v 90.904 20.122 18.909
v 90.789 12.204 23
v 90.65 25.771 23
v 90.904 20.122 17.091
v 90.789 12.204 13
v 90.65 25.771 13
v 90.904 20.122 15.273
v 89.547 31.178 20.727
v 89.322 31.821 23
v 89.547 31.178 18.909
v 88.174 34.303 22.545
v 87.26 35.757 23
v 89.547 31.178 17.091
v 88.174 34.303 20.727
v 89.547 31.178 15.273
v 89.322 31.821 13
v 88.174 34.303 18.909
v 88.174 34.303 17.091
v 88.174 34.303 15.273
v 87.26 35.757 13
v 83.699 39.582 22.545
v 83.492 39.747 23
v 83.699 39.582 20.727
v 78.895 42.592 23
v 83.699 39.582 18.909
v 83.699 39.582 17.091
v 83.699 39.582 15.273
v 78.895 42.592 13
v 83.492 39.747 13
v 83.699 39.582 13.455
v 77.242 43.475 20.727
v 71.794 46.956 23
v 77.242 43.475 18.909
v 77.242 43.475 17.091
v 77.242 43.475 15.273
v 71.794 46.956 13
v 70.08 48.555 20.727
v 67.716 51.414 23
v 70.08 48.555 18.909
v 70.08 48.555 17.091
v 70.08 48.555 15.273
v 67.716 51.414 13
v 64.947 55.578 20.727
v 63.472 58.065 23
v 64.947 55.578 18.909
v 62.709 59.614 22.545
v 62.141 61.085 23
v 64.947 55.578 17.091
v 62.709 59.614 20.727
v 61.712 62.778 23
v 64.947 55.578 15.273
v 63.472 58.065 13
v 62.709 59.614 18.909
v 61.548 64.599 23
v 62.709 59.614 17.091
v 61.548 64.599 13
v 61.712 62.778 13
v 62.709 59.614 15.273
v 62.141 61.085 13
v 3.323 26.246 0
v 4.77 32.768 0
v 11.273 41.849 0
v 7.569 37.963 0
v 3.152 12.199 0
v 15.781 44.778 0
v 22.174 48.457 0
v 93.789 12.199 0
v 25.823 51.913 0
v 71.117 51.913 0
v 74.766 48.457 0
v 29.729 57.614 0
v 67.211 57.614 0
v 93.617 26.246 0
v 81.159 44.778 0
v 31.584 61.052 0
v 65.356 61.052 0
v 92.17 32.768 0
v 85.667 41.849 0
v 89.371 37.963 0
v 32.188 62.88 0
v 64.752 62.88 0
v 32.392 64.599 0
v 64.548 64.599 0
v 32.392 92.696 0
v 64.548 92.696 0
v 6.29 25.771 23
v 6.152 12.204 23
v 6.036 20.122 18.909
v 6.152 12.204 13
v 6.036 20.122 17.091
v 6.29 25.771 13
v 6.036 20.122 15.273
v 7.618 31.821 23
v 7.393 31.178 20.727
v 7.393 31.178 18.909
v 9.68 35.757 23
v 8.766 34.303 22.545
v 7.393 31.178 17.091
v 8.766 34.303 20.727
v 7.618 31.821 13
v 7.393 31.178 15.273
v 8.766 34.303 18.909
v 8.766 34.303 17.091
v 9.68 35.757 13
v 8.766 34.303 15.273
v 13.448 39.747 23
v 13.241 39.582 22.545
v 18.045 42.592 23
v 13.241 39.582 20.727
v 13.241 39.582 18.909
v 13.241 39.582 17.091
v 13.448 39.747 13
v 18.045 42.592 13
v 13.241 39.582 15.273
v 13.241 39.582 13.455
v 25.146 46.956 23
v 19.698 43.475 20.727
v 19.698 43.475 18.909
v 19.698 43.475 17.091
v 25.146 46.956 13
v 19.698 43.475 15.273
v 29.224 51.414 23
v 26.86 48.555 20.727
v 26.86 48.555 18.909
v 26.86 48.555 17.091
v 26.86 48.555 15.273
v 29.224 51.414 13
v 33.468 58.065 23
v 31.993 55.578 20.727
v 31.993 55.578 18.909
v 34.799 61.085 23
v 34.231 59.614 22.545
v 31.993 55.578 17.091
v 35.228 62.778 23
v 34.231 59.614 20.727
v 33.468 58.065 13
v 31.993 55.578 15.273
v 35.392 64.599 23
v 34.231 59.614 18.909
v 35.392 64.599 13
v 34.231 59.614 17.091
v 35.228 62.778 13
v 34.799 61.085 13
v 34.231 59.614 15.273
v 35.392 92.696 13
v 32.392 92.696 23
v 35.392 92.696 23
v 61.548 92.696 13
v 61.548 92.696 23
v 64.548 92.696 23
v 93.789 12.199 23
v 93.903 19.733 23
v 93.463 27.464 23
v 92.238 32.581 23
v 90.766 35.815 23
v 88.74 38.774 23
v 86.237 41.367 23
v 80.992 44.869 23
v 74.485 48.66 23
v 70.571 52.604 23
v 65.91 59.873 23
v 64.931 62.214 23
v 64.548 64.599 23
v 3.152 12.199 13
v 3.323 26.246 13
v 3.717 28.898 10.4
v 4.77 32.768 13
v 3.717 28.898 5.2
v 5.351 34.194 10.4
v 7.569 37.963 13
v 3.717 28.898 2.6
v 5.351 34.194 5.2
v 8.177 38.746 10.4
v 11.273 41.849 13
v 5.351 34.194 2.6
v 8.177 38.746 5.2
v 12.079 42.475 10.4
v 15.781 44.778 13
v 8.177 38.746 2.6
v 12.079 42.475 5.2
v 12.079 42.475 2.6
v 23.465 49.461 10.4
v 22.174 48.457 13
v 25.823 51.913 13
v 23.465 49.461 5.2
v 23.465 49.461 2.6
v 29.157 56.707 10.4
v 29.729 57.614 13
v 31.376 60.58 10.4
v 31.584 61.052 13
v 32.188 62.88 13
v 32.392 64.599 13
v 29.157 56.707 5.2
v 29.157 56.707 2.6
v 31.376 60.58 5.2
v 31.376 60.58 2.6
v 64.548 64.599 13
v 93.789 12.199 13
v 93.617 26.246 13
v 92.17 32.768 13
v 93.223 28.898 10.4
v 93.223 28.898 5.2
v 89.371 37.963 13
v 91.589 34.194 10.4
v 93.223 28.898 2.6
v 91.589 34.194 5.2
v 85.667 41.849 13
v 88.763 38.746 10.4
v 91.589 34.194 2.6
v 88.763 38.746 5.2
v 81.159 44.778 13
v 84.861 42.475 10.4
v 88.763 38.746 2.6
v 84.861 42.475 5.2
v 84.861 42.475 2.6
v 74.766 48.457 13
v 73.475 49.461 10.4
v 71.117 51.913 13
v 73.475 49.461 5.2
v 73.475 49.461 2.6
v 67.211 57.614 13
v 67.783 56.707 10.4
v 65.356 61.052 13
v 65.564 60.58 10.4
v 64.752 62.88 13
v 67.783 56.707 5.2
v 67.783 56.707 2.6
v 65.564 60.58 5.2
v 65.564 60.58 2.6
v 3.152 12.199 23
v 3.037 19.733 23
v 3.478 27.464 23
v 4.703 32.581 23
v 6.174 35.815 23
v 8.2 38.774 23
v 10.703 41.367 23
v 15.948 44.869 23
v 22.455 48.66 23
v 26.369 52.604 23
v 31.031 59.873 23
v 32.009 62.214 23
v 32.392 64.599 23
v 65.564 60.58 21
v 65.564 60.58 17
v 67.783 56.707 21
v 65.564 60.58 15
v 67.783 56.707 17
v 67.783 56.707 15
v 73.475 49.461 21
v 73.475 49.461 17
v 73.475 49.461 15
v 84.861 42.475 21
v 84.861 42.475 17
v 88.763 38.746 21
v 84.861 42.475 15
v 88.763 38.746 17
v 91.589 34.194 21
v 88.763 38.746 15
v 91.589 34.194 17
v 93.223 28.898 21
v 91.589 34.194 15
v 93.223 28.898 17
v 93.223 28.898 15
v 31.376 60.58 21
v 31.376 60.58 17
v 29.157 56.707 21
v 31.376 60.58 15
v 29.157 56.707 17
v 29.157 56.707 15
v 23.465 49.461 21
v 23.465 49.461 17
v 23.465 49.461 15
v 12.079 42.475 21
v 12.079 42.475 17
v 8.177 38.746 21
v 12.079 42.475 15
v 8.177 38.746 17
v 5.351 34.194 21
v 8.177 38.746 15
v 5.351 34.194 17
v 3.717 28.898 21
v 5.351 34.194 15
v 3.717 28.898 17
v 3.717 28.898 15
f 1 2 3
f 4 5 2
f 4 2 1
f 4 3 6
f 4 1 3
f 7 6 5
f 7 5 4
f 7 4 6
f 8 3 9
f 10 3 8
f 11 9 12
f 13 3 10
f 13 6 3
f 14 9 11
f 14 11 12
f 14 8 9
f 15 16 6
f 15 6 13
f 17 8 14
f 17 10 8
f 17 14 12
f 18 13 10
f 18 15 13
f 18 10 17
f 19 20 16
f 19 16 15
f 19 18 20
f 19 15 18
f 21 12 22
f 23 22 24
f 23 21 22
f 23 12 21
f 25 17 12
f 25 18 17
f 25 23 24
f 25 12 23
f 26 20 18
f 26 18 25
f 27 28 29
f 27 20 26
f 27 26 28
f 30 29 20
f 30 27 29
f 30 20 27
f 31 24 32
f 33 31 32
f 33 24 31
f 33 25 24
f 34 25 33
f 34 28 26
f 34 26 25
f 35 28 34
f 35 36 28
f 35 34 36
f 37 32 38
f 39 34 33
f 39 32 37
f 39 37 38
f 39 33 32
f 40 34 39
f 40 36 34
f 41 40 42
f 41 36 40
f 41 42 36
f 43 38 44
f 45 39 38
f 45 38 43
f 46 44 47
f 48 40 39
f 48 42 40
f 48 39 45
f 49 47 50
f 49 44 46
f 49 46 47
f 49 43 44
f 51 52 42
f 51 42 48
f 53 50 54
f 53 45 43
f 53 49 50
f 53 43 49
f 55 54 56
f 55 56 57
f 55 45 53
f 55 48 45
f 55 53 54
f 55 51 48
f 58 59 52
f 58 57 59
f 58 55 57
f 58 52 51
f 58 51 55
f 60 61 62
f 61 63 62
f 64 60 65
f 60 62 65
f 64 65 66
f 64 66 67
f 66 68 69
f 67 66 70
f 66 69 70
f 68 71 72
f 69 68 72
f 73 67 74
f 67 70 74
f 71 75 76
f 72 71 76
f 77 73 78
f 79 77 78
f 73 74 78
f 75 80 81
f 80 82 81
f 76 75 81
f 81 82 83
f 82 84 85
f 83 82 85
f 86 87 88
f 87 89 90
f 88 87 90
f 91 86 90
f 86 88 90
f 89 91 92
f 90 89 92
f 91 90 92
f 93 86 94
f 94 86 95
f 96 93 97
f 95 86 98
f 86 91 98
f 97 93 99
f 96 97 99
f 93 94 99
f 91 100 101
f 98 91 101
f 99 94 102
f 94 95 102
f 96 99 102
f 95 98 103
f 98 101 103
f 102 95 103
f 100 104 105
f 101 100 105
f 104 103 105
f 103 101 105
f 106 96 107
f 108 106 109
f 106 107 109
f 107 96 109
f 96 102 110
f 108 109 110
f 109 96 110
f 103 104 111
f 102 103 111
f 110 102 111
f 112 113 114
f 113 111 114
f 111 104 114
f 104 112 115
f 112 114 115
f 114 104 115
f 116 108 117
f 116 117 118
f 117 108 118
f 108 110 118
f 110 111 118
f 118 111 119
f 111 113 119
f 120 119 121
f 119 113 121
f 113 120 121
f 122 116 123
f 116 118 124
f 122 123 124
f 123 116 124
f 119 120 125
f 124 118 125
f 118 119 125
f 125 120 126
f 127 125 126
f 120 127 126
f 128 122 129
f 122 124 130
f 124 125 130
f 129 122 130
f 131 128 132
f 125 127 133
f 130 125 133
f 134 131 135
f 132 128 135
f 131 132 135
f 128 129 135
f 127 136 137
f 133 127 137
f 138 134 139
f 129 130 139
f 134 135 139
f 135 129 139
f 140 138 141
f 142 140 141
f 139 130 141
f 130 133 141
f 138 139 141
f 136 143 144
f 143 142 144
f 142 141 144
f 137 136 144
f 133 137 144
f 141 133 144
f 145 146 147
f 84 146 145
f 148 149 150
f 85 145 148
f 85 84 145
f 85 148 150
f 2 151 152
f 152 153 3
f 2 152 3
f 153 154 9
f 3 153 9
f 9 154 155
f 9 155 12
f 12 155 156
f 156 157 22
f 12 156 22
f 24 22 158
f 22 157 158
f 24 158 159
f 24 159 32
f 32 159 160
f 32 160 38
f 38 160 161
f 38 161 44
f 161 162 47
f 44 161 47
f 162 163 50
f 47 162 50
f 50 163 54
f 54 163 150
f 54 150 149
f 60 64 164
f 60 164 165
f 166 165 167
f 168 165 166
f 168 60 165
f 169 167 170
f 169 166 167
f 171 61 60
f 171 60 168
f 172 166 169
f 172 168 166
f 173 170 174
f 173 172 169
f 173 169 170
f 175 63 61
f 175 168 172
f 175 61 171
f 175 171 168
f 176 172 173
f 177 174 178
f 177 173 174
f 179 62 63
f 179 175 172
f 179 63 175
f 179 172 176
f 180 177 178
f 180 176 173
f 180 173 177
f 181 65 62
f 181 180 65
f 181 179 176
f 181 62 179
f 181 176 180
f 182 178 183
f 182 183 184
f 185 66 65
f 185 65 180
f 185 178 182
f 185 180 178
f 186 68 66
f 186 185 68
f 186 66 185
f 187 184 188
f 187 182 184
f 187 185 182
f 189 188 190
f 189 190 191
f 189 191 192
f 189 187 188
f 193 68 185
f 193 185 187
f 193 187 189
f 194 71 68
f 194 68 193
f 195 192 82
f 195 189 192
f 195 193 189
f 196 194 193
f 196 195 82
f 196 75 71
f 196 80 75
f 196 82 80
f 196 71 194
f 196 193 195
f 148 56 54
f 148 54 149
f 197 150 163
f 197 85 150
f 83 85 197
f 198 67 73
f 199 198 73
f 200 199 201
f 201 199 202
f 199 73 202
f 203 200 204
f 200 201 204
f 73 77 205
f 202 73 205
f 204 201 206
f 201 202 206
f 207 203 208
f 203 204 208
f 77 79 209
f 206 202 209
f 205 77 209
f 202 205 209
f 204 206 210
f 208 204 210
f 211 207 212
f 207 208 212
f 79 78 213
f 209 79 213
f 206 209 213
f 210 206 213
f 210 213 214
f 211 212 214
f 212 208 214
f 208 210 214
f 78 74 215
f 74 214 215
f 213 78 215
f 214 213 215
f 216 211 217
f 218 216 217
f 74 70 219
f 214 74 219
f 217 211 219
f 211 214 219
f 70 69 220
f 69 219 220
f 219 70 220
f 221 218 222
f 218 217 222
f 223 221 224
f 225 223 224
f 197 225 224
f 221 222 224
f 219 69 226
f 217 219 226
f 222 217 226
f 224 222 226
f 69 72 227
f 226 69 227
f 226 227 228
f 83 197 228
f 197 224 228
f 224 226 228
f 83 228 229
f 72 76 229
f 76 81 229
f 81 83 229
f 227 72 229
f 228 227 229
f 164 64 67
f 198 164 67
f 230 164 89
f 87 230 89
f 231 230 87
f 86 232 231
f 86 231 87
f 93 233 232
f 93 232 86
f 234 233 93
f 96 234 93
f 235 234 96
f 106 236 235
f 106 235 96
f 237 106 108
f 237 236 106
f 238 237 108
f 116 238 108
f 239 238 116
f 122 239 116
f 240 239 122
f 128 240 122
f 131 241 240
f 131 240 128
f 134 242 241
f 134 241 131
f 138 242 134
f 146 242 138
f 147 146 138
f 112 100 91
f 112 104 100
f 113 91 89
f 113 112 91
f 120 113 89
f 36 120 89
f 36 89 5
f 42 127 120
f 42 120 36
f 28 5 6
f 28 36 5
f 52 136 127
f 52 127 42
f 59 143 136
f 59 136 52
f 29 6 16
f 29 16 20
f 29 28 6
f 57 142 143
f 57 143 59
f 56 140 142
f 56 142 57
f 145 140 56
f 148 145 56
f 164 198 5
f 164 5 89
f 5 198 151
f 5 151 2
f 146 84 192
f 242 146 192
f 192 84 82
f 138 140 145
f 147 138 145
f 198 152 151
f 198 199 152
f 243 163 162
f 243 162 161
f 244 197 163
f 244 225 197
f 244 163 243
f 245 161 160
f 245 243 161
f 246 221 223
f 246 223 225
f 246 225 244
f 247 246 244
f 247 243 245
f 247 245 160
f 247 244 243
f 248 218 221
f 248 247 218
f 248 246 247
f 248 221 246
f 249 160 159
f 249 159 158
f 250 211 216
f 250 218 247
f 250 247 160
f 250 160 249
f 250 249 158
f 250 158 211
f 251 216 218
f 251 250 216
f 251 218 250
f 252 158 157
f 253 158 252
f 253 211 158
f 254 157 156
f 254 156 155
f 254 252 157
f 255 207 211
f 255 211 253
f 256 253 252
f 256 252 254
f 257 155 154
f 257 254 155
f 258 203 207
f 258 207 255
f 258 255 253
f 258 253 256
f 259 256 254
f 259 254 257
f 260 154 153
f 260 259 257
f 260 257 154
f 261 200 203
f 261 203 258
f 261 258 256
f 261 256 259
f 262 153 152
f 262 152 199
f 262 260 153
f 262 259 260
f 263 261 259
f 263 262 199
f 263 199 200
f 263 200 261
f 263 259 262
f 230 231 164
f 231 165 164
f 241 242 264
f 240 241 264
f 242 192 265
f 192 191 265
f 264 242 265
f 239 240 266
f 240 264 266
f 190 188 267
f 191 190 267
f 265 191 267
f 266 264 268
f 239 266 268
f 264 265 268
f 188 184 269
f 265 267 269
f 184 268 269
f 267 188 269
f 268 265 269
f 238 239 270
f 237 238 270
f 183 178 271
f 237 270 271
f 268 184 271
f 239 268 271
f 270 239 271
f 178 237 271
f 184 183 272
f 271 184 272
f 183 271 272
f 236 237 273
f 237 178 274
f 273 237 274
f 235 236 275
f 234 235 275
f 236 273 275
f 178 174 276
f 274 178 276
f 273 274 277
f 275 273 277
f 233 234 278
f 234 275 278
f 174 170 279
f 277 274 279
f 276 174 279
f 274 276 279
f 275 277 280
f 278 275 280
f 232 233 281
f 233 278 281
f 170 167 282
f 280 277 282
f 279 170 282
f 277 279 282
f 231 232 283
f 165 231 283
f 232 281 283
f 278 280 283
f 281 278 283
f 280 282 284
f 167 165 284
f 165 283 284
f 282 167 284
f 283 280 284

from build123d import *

# Parameters (mm, degrees)
ESTRUSIONE_ESTRUSIONE1_DEPTH = 13
ESTRUSIONE_SOTTILE5_DEPTH    = 10


# Read off the part's stored shape, not the designer's step: Estrusione-Sottile5
with BuildPart() as part:
    # Schizzo1 → Estrusione-Estrusione1 (new body)
    with BuildSketch(Plane.XY):
        with BuildLine():
            Line((32.3920487, 64.599216546), (32.3920487, 92.695802437))
            Line((32.3920487, 92.695802437), (48.470036729, 92.695802437))
            Line((48.470036729, 92.695802437), (48.470036729, 12.199228267))
            Line((48.470036729, 12.199228267), (3.151561413, 12.199228267))
            add(Edge.make_bspline(
                [(3.151561413, 12.199228267), (3.139611177, 19.224996267), (1.892686637, 31.387863298), (12.137321926, 43.966124148), (23.267751598, 47.670295467), (28.997328985, 56.366188951), (32.3920487, 61.880405589), (32.3920487, 64.599216546)],
                knots=[0, 0, 0, 0, 0.347386822, 0.514075999, 0.722780372, 0.866740614, 1, 1, 1, 1], degree=3))
        make_face()
    estrusione_estrusione1 = extrude(amount=ESTRUSIONE_ESTRUSIONE1_DEPTH)

    # Estrusione-Sottile5 outline → Estrusione-Sottile5 (add)
    with BuildSketch(Plane.XY.offset(13)):
        with BuildLine():
            Line((32.3920487, 92.695802437), (32.3920487, 64.599216546))
            add(Edge.make_bspline(
                [(32.3920487, 64.599216546), (32.3920487, 61.880405589), (28.997328985, 56.366188951), (23.267751598, 47.670295467), (12.137321926, 43.966124148), (1.892686637, 31.387863298), (3.139611177, 19.224996267), (3.151561413, 12.199228267)],
                knots=[0, 0, 0, 0, 0.133259386, 0.277219628, 0.485924001, 0.652613178, 1, 1, 1, 1], degree=3))
            Line((3.151561413, 12.199228267), (6.151557074, 12.204331005))
            add(Edge.make_bspline(
                [(6.151557074, 12.204331005), (6.149334866, 13.510808651), (6.119648943, 14.831885644), (6.06293225, 17.480029501), (6.03584378, 18.807019929), (6.037068448, 22.752005394), (6.151453161, 25.333469119), (6.757390346, 28.929919641), (7.030718923, 30.082494468), (7.57350109, 31.725152792), (7.776519692, 32.258469787), (8.231352372, 33.295835374), (8.485381605, 33.804131964), (9.889253187, 36.299307042), (11.433784909, 38.123415419), (13.69240187, 39.947060574), (14.157760625, 40.286091152), (15.150594798, 40.947311626), (15.673944983, 41.267323739), (17.308950011, 42.213099328), (18.485640453, 42.822946504), (20.909634026, 44.126845944), (22.157818902, 44.820909202), (23.995293063, 46.057426343), (24.601789725, 46.502652624), (25.48644282, 47.23845245), (25.775807333, 47.494631032), (26.331807302, 48.016372792), (26.600288227, 48.283277702), (27.899876834, 49.642128534), (28.802450288, 50.804747978), (30.05266046, 52.580806918), (30.452110657, 53.178644998), (31.036934657, 54.076643069), (31.229471218, 54.376192918), (31.61150898, 54.974569074), (31.800421327, 55.271652753), (32.379300522, 56.190094836), (32.774413439, 56.829941685), (33.536773588, 58.171274416), (33.90437134, 58.872854876), (34.558322607, 60.355334084), (34.845244987, 61.13702646), (35.262518462, 62.798404364), (35.3920487, 63.680139971), (35.3920487, 64.599216546)],
                knots=[0, 0, 0, 0, 0.0625, 0.0625, 0.125, 0.125, 0.25, 0.25, 0.3125, 0.3125, 0.34375, 0.34375, 0.375, 0.375, 0.5, 0.5, 0.53125, 0.53125, 0.5625, 0.5625, 0.625, 0.625, 0.6875, 0.6875, 0.71875, 0.71875, 0.734375, 0.734375, 0.75, 0.75, 0.8125, 0.8125, 0.84375, 0.84375, 0.859375, 0.859375, 0.875, 0.875, 0.90625, 0.90625, 0.9375, 0.9375, 0.96875, 0.96875, 1, 1, 1, 1], degree=3))
            Line((35.3920487, 64.599216546), (35.3920487, 92.695802437))
            Line((35.3920487, 92.695802437), (32.3920487, 92.695802437))
        make_face()
    estrusione_sottile5 = extrude(amount=ESTRUSIONE_SOTTILE5_DEPTH)

    # Specchia1: Estrusione-Estrusione1, Estrusione-Sottile5 across plane
    add(estrusione_estrusione1.mirror(Plane(origin=(48.470036729, 12.199228267, 13), x_dir=(0, 0, 1), z_dir=(-1, 0, 0))))
    add(estrusione_sottile5.mirror(Plane(origin=(48.470036729, 12.199228267, 13), x_dir=(0, 0, 1), z_dir=(-1, 0, 0))))


solid = part.part
